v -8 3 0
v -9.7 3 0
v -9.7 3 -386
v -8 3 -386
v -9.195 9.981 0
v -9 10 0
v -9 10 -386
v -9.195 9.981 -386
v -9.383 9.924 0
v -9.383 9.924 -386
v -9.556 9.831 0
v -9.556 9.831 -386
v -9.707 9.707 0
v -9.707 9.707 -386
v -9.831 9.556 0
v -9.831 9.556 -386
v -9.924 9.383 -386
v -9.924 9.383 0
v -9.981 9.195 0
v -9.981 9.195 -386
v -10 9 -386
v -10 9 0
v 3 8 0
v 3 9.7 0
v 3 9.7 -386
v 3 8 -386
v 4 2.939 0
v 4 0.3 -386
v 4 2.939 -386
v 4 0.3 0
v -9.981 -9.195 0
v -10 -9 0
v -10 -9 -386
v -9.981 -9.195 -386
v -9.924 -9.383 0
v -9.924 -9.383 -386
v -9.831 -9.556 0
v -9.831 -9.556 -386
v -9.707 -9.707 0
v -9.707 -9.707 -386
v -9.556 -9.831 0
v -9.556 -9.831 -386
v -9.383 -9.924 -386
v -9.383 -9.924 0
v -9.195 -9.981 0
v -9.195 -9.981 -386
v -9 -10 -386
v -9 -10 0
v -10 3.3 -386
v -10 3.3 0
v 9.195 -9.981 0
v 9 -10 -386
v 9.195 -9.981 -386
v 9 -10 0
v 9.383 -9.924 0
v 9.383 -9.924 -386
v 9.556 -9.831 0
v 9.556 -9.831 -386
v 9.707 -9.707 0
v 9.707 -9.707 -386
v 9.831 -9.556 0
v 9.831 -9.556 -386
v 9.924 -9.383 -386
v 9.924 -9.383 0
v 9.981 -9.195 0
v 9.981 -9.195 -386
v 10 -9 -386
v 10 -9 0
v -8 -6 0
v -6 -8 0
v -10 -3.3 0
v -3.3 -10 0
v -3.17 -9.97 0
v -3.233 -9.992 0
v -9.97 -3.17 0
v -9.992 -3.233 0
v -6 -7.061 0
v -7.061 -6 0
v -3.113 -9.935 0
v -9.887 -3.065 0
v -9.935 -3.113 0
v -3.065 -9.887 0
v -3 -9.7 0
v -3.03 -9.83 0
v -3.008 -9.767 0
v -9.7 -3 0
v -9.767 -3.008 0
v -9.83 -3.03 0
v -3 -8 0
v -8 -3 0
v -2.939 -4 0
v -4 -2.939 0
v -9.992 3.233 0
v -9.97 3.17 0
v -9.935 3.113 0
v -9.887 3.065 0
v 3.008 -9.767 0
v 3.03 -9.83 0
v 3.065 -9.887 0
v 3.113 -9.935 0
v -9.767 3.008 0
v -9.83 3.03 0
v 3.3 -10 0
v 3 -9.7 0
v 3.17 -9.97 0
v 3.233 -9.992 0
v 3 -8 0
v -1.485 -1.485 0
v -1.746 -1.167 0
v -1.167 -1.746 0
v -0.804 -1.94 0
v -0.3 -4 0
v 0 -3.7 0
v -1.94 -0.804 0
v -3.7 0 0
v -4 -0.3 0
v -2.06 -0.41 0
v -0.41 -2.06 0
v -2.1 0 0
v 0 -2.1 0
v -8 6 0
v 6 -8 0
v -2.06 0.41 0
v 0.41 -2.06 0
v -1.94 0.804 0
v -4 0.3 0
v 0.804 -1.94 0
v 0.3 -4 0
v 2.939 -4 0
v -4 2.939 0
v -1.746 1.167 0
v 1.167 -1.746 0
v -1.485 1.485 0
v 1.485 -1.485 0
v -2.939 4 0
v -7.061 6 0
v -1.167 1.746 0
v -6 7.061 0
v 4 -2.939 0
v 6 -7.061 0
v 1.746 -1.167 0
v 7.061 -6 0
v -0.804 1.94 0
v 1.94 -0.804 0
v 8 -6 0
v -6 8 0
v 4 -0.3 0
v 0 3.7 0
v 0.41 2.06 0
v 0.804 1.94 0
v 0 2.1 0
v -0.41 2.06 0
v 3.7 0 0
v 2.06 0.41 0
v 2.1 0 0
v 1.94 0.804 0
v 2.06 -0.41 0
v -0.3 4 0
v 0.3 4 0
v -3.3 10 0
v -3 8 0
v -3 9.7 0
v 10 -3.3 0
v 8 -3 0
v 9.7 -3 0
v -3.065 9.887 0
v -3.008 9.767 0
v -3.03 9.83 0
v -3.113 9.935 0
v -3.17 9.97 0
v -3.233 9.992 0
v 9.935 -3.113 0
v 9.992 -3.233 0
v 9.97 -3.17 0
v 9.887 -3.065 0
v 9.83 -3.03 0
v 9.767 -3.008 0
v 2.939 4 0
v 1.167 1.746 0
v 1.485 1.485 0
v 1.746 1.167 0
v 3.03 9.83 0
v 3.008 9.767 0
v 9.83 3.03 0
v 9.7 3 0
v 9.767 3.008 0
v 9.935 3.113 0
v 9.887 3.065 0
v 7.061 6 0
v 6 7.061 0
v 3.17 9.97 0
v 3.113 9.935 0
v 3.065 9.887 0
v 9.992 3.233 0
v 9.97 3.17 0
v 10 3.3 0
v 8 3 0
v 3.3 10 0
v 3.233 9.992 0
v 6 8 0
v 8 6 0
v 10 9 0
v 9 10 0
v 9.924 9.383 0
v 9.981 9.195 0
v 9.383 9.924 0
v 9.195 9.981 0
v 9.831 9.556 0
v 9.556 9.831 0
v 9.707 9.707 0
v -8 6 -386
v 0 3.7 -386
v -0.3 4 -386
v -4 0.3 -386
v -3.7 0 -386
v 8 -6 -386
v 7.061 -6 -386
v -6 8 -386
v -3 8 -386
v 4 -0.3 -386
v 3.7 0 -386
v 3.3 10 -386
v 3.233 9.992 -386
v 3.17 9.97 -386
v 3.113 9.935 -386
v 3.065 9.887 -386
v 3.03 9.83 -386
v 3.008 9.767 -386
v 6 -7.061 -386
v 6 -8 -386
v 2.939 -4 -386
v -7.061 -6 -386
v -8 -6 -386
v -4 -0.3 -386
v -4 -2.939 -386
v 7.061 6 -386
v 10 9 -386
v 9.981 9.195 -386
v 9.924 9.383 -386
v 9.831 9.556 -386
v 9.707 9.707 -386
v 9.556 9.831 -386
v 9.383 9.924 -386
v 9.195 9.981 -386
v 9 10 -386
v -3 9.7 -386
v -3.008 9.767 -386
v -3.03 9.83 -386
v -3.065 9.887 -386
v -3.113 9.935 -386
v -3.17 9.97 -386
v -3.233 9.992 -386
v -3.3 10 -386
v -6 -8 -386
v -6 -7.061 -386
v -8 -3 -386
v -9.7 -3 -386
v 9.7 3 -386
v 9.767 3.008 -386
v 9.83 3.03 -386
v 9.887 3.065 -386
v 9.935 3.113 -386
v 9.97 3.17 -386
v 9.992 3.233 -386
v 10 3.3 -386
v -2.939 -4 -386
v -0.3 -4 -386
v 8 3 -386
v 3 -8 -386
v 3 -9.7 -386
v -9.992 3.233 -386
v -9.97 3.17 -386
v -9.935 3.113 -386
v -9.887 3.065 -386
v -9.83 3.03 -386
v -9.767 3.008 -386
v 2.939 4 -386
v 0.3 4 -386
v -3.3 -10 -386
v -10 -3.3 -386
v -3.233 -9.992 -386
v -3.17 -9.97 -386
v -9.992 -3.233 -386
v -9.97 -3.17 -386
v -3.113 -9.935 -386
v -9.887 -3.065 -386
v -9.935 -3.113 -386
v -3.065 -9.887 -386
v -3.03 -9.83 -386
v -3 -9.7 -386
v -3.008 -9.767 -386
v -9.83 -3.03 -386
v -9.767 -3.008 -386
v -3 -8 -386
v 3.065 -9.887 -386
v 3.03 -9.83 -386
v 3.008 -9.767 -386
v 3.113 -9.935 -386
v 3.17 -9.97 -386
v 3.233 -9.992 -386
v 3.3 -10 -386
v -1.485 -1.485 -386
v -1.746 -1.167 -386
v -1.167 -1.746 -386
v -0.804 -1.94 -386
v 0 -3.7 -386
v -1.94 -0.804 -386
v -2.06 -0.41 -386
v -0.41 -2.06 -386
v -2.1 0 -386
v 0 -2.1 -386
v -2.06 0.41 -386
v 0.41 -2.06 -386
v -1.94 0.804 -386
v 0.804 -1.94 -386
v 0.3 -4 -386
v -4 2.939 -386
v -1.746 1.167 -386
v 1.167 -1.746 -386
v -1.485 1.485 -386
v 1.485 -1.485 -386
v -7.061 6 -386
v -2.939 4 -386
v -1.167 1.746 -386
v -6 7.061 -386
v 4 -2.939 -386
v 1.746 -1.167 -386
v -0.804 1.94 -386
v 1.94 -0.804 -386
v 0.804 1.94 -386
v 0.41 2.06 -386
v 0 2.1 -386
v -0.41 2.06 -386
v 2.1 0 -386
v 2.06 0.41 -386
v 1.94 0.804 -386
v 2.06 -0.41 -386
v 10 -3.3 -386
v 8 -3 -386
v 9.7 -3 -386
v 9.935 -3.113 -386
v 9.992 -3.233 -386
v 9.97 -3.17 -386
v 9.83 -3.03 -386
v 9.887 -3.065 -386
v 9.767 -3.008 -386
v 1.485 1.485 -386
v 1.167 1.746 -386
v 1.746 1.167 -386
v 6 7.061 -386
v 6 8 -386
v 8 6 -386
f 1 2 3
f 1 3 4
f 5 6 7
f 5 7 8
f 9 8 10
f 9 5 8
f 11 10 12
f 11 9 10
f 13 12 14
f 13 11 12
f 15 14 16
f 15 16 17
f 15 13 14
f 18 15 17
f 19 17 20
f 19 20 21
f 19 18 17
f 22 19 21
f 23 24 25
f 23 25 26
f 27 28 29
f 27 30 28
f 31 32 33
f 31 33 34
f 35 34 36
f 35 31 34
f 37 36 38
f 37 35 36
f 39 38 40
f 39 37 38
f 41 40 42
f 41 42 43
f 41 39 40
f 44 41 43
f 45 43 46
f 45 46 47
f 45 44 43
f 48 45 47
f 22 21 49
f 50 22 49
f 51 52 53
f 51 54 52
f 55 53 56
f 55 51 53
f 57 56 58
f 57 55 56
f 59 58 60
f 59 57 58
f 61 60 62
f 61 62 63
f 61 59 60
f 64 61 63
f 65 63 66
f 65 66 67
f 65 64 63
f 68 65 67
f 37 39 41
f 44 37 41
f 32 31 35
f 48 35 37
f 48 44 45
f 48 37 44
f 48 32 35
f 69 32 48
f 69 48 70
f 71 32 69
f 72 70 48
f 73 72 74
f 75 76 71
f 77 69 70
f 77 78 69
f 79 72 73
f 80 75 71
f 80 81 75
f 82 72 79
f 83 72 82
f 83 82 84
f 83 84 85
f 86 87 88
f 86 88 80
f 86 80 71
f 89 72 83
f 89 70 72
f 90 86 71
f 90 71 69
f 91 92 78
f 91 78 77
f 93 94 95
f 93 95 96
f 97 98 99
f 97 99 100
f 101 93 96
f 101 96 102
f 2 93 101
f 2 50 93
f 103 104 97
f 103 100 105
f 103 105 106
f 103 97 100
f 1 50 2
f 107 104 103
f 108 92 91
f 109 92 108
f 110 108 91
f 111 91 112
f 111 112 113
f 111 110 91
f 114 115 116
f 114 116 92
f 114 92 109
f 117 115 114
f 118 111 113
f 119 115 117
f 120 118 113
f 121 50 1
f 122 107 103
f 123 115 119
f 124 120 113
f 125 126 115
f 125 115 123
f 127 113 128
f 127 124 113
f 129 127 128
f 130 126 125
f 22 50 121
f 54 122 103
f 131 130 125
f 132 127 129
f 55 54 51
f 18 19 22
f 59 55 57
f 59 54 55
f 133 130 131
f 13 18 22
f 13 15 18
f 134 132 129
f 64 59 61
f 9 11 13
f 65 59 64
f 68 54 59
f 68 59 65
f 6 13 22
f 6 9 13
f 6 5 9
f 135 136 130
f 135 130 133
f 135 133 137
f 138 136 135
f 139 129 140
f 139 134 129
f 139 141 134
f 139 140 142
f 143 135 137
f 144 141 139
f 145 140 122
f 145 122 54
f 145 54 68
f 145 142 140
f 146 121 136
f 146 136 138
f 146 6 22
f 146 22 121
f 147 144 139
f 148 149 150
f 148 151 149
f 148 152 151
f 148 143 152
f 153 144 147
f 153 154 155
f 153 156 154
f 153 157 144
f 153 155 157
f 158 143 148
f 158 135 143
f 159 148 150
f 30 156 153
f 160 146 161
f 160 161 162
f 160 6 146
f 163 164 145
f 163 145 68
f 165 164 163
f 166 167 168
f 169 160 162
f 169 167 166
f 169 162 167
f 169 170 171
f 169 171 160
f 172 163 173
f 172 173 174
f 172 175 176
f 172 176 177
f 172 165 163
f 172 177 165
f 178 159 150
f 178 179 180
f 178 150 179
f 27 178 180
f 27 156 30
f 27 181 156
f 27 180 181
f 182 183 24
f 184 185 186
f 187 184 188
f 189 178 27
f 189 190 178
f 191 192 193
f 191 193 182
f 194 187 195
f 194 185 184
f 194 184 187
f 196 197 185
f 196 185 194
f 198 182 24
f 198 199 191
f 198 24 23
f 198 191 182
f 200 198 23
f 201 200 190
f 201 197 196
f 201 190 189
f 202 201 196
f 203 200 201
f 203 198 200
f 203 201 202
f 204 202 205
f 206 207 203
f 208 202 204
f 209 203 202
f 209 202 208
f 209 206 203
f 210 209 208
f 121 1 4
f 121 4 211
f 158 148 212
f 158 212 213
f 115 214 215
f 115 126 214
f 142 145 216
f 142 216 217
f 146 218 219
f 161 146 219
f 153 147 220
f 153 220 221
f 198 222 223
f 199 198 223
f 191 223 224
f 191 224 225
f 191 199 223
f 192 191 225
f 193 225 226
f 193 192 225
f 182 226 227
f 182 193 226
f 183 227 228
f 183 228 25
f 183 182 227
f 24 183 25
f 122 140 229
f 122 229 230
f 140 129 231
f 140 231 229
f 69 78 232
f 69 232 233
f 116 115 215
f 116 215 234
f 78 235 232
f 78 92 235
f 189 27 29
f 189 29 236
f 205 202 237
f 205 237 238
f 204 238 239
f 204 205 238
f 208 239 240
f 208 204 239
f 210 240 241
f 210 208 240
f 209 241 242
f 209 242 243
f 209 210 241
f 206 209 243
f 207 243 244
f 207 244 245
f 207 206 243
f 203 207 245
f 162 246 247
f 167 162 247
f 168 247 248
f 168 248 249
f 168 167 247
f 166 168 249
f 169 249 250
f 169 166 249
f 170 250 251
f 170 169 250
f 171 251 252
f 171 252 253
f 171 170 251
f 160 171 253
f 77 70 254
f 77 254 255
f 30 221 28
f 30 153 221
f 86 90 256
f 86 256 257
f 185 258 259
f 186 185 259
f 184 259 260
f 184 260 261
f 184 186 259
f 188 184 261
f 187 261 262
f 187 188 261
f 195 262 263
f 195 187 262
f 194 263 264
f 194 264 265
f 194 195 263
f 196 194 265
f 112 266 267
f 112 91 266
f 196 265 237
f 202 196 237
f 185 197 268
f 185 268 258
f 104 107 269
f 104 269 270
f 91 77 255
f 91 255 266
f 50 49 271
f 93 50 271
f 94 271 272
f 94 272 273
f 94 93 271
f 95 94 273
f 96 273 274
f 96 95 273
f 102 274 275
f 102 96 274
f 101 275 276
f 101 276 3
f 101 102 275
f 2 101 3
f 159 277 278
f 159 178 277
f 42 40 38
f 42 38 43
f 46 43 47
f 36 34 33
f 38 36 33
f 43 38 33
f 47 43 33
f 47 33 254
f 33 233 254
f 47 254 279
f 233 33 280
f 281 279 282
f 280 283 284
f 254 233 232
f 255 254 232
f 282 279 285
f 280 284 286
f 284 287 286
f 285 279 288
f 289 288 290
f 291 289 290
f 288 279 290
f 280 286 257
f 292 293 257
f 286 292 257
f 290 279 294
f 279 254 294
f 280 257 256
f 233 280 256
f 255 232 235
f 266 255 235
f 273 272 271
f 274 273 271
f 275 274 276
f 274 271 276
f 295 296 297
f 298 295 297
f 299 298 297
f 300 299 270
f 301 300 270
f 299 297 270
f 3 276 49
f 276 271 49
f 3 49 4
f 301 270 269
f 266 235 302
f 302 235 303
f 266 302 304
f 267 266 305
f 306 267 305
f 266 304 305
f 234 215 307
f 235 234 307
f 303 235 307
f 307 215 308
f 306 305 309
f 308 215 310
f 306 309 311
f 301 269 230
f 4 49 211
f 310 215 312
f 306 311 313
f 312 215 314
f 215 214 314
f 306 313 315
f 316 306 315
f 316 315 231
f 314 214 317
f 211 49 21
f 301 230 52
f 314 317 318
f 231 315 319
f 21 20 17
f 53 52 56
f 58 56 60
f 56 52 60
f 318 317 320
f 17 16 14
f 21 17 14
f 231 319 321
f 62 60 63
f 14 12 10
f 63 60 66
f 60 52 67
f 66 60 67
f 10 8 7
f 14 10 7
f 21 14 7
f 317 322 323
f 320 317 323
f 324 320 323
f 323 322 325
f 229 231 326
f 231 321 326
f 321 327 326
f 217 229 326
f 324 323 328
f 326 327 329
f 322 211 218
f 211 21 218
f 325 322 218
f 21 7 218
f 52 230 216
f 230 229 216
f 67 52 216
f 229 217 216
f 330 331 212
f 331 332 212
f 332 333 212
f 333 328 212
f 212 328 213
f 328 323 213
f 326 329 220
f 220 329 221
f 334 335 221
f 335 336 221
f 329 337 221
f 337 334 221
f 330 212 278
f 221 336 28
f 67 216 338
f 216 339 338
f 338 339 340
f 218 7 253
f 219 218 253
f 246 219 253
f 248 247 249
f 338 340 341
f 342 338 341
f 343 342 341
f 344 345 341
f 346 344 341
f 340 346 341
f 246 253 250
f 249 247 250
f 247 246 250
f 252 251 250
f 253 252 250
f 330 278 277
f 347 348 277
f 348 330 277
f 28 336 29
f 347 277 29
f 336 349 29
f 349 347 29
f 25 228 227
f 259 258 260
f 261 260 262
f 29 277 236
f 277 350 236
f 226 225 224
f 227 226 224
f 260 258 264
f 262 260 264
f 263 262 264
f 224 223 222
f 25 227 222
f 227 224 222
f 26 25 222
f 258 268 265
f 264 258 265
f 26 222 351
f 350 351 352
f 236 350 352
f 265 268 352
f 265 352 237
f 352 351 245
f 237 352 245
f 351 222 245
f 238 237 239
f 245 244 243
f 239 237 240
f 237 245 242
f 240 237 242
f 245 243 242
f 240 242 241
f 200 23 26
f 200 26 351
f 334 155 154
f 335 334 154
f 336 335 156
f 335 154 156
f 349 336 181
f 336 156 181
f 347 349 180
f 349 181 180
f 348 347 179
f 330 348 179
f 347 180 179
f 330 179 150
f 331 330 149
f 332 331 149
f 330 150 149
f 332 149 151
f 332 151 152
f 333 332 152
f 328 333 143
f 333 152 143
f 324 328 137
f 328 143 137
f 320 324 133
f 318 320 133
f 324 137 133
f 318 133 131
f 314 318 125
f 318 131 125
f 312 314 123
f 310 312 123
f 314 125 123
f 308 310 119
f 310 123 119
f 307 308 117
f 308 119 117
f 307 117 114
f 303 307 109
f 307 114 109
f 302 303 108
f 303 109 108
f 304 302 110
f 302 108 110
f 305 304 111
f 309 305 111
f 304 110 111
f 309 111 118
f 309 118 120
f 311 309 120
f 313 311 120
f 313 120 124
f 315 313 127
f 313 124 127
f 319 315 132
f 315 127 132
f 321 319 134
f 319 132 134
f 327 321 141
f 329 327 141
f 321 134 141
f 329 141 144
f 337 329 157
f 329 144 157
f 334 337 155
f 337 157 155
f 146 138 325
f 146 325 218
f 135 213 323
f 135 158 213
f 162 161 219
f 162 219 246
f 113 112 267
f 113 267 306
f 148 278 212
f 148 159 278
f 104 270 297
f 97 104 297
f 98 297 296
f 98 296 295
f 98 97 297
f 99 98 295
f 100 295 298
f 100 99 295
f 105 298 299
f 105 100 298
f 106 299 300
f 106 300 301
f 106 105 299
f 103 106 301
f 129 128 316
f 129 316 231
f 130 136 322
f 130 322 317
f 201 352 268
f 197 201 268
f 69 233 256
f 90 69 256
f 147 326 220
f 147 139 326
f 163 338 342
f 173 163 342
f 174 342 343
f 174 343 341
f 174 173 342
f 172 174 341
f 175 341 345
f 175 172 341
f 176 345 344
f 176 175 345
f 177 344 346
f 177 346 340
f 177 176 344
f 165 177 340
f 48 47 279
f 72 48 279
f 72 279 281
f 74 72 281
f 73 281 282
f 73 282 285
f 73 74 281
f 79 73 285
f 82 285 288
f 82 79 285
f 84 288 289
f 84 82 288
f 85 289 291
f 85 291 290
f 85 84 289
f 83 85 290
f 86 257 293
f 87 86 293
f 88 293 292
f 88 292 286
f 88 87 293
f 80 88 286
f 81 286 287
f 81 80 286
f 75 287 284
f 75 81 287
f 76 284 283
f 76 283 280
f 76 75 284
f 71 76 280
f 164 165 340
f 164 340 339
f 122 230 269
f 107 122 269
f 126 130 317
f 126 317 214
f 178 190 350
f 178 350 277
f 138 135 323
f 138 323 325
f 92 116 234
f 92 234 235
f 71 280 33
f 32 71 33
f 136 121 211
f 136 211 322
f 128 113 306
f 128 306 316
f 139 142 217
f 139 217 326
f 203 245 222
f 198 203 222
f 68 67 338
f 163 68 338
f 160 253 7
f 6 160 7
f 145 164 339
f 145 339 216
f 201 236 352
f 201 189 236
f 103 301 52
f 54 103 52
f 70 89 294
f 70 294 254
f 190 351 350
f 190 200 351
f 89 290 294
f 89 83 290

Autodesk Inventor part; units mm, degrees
ref_plane "YZ Plane" through (0, 0, 0) normal (1, 0, 0) x (0, 1, 0)
ref_plane "XZ Plane" through (0, 0, 0) normal (0, 1, 0) x (-1, 0, 0)
ref_plane "XY Plane" through (0, 0, 0) normal (0, 0, 1) x (1, 0, 0)
sketch "Sketch_5" plane through (0, 0, 0) normal (0, 0, 1) x (1, 0, 0)
  line L0 (-10, 9) -> (-10, 3.3)
  arc A0 (-10, 3.3) -> (-9.7, 3) centre (-9.7, 3.3) ccw
  line L1 (-9.7, 3) -> (-8, 3)
  line L2 (-8, 3) -> (-8, 6)
  line L3 (-8, 6) -> (-7.0607, 6)
  line L4 (-7.0607, 6) -> (-4, 2.9393)
  line L5 (-4, 2.9393) -> (-4, 0.3)
  line L6 (-4, 0.3) -> (-3.7, 0)
  line L7 (-3.7, 0) -> (-4, -0.3)
  line L8 (-4, -0.3) -> (-4, -2.9393)
  line L9 (-4, -2.9393) -> (-7.0607, -6)
  line L10 (-7.0607, -6) -> (-8, -6)
  line L11 (-8, -6) -> (-8, -3)
  line L12 (-8, -3) -> (-9.7, -3)
  arc A1 (-9.7, -3) -> (-10, -3.3) centre (-9.7, -3.3) ccw
  line L13 (-10, -3.3) -> (-10, -9)
  arc A2 (-10, -9) -> (-9, -10) centre (-9, -9) ccw
  line L14 (-9, -10) -> (-3.3, -10)
  arc A3 (-3.3, -10) -> (-3, -9.7) centre (-3.3, -9.7) ccw
  line L15 (-3, -9.7) -> (-3, -8)
  line L16 (-3, -8) -> (-6, -8)
  line L17 (-6, -8) -> (-6, -7.0607)
  line L18 (-6, -7.0607) -> (-2.9393, -4)
  line L19 (-2.9393, -4) -> (-0.3, -4)
  line L20 (-0.3, -4) -> (0, -3.7)
  line L21 (0, -3.7) -> (0.3, -4)
  line L22 (0.3, -4) -> (2.9393, -4)
  line L23 (2.9393, -4) -> (6, -7.0607)
  line L24 (6, -7.0607) -> (6, -8)
  line L25 (6, -8) -> (3, -8)
  line L26 (3, -8) -> (3, -9.7)
  arc A4 (3, -9.7) -> (3.3, -10) centre (3.3, -9.7) ccw
  line L27 (3.3, -10) -> (9, -10)
  arc A5 (9, -10) -> (10, -9) centre (9, -9) ccw
  line L28 (10, -9) -> (10, -3.3)
  arc A6 (10, -3.3) -> (9.7, -3) centre (9.7, -3.3) ccw
  line L29 (9.7, -3) -> (8, -3)
  line L30 (8, -3) -> (8, -6)
  line L31 (8, -6) -> (7.0607, -6)
  line L32 (7.0607, -6) -> (4, -2.9393)
  line L33 (4, -2.9393) -> (4, -0.3)
  line L34 (4, -0.3) -> (3.7, 0)
  line L35 (3.7, 0) -> (4, 0.3)
  line L36 (4, 0.3) -> (4, 2.9393)
  line L37 (4, 2.9393) -> (7.0607, 6)
  line L38 (7.0607, 6) -> (8, 6)
  line L39 (8, 6) -> (8, 3)
  line L40 (8, 3) -> (9.7, 3)
  arc A7 (9.7, 3) -> (10, 3.3) centre (9.7, 3.3) ccw
  line L41 (10, 3.3) -> (10, 9)
  arc A8 (10, 9) -> (9, 10) centre (9, 9) ccw
  line L42 (9, 10) -> (3.3, 10)
  arc A9 (3.3, 10) -> (3, 9.7) centre (3.3, 9.7) ccw
  line L43 (3, 9.7) -> (3, 8)
  line L44 (3, 8) -> (6, 8)
  line L45 (6, 8) -> (6, 7.0607)
  line L46 (6, 7.0607) -> (2.9393, 4)
  line L47 (2.9393, 4) -> (0.3, 4)
  line L48 (0.3, 4) -> (0, 3.7)
  line L49 (0, 3.7) -> (-0.3, 4)
  line L50 (-0.3, 4) -> (-2.9393, 4)
  line L51 (-2.9393, 4) -> (-6, 7.0607)
  line L52 (-6, 7.0607) -> (-6, 8)
  line L53 (-6, 8) -> (-3, 8)
  line L54 (-3, 8) -> (-3, 9.7)
  arc A10 (-3, 9.7) -> (-3.3, 10) centre (-3.3, 9.7) ccw
  line L55 (-3.3, 10) -> (-9, 10)
  arc A11 (-9, 10) -> (-10, 9) centre (-9, 9) ccw
  circle A12 centre (0, 0) radius 2.1
extrude "Extrusion1" add sketch "Sketch_5" against normal blind 386
properties part number "KHFS5-2020-4000" material "Aluminum 6061"
